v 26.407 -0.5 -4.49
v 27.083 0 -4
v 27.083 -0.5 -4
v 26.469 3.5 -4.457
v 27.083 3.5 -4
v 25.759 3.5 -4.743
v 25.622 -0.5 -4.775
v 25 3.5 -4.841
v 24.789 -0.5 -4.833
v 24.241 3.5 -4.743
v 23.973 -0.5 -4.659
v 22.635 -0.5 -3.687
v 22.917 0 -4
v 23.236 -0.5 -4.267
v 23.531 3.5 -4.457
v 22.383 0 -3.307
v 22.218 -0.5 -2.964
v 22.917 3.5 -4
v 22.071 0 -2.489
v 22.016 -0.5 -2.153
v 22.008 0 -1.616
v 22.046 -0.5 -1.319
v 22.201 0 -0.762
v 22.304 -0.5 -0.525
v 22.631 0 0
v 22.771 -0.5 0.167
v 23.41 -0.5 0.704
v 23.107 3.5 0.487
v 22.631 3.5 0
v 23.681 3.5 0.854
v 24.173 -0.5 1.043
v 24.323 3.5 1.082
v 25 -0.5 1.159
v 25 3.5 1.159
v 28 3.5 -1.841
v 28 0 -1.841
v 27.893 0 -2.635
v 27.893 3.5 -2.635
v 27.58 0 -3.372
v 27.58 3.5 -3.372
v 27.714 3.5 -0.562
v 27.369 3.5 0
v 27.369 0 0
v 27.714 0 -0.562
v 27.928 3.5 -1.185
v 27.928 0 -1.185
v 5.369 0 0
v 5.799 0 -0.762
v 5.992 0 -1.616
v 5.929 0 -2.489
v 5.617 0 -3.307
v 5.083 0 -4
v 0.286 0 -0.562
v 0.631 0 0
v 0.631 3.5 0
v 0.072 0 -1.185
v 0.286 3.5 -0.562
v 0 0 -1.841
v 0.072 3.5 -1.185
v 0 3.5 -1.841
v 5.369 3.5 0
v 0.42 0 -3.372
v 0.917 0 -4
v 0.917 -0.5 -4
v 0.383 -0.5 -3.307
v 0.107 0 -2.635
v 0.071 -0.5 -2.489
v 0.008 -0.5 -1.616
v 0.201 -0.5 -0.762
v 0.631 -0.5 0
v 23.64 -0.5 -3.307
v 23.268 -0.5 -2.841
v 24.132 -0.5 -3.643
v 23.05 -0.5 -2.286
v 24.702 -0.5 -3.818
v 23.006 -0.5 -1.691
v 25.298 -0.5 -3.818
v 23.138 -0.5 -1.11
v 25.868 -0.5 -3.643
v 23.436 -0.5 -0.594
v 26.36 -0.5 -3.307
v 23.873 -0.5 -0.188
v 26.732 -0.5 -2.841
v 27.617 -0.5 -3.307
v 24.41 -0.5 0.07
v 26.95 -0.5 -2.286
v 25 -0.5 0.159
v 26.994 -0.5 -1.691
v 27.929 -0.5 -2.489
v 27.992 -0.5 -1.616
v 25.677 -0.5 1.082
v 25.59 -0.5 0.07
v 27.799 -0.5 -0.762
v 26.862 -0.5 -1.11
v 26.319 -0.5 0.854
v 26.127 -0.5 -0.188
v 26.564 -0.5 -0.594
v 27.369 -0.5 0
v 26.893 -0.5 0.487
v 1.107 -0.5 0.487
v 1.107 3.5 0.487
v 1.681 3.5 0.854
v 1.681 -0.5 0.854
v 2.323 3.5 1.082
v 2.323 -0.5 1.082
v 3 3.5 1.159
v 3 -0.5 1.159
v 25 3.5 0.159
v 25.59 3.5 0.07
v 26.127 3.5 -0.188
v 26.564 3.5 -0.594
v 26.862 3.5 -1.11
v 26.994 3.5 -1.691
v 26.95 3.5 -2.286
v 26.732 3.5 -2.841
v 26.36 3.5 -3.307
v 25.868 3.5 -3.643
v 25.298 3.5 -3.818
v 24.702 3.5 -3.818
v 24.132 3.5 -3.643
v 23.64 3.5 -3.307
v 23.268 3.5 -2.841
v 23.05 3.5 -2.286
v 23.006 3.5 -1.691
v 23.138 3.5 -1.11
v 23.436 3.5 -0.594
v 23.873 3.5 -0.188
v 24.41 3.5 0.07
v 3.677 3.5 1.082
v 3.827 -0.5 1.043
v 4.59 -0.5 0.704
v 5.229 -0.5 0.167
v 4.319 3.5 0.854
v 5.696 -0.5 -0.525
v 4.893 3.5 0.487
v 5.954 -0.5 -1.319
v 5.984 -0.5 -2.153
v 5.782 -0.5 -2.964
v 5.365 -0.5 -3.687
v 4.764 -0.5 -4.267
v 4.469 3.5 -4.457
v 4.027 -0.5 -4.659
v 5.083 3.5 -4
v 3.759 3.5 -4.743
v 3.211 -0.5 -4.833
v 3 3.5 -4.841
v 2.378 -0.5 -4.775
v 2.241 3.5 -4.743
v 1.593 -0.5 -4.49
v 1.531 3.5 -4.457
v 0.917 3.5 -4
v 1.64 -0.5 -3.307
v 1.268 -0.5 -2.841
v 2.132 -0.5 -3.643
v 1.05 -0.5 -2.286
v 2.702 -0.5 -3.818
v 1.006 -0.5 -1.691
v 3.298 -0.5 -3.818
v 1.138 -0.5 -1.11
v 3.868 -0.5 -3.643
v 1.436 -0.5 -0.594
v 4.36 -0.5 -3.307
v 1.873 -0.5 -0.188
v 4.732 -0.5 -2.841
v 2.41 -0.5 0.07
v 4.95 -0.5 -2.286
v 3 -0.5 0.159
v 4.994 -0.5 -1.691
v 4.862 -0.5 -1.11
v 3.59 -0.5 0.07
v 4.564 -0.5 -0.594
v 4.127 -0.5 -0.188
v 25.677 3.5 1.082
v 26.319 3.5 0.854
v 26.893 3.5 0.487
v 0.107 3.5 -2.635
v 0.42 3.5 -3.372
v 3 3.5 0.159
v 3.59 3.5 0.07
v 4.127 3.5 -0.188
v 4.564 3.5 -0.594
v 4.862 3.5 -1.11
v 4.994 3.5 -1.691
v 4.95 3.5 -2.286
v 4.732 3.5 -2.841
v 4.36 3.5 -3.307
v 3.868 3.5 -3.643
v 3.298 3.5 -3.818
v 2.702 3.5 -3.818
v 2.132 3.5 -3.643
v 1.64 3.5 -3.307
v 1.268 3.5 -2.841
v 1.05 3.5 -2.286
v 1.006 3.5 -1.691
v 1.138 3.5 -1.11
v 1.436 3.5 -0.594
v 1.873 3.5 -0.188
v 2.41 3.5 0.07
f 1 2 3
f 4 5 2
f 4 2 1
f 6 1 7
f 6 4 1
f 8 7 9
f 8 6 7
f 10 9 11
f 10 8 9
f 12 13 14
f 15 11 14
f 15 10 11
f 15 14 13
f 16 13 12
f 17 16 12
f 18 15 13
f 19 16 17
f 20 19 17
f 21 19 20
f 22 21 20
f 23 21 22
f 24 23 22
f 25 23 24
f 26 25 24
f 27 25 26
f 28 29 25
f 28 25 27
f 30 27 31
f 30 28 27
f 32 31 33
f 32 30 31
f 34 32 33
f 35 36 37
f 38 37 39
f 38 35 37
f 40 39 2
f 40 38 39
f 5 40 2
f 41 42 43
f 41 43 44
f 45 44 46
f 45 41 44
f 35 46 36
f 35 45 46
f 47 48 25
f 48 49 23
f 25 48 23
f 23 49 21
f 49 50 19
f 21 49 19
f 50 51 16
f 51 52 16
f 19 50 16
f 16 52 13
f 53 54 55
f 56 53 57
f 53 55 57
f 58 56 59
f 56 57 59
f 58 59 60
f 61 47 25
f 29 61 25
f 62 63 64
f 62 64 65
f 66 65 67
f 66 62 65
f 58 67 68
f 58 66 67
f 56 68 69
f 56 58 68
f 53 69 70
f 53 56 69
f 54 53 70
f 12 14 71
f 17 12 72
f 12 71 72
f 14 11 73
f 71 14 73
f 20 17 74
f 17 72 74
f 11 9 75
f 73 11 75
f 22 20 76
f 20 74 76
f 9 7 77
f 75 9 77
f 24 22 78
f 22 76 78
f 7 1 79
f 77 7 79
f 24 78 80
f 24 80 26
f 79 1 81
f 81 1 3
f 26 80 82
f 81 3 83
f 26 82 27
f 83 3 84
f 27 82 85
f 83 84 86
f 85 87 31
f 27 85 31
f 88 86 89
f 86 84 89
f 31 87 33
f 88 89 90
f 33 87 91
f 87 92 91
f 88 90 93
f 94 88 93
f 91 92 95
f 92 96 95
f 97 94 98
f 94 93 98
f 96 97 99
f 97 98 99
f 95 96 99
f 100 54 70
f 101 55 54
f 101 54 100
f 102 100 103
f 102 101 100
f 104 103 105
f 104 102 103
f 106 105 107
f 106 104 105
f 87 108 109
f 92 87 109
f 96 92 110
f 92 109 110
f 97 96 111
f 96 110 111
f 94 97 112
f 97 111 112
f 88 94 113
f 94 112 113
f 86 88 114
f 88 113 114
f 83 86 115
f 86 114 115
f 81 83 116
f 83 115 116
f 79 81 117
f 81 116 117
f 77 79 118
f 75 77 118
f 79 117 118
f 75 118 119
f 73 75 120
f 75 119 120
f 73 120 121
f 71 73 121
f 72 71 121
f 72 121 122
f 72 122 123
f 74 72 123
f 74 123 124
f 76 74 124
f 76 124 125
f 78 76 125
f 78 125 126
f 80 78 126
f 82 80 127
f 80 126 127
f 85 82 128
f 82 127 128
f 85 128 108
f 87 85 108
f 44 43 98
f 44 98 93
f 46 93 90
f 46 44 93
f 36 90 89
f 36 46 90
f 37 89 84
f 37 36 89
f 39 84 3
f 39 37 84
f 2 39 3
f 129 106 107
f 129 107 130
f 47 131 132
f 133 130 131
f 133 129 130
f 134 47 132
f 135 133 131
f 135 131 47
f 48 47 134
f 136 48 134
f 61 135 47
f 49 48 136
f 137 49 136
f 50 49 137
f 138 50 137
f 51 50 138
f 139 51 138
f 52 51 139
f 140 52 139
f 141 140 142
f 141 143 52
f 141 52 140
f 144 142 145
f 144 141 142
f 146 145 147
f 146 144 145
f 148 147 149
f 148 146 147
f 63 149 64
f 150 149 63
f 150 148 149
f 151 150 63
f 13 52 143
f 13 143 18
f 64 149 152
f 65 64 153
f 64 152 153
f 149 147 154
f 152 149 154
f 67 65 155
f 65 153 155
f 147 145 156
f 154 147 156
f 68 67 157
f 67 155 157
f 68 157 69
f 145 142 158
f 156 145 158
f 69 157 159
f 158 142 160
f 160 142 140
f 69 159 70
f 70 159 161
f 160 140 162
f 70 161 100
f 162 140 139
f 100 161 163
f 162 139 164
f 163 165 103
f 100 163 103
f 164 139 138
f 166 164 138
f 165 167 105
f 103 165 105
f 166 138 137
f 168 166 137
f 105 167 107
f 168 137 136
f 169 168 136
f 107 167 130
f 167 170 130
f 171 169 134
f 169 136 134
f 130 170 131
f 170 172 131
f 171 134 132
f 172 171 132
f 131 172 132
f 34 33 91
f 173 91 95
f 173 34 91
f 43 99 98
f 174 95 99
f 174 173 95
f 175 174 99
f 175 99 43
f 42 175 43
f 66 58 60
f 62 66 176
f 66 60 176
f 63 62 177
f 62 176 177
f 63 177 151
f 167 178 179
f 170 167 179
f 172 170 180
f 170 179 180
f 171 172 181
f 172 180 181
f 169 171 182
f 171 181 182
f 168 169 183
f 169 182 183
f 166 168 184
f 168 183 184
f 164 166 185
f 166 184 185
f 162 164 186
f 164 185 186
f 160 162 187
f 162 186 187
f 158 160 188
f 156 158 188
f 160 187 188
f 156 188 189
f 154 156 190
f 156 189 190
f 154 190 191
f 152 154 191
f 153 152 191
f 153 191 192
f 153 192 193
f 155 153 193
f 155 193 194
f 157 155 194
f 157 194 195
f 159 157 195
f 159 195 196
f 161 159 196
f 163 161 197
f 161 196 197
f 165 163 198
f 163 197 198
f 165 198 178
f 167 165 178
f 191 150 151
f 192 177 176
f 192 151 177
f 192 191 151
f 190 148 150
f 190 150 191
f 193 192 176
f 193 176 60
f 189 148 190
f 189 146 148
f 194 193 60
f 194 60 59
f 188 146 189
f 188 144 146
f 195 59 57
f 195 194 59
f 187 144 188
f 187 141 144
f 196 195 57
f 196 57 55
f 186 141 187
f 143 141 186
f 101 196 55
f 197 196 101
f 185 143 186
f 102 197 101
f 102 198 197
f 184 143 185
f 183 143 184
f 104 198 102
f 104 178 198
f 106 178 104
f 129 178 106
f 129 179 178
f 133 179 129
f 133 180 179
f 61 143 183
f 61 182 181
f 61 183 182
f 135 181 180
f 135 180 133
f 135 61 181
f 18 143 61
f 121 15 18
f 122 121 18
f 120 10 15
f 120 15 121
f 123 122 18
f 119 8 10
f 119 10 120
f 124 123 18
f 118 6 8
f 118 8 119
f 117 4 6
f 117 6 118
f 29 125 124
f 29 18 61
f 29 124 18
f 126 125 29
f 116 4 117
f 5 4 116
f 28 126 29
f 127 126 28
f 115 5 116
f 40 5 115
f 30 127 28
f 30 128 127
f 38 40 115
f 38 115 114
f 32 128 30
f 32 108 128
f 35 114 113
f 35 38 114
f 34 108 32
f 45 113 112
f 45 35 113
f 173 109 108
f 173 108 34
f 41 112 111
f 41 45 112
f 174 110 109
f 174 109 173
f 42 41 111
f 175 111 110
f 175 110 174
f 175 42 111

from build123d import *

# Parameters (mm, degrees)
ESQUISSE1_W             = 28
ESQUISSE1_H             = 4
BOSS_EXTRU_1_DEPTH      = 3.5
ESQUISSE2_R             = 3
BOSS_EXTRU_2_DEPTH      = 4
ESQUISSE3_R             = 2
ENL_V_MAT_EXTRU_1_DEPTH = 4
ENL_V_MAT_EXTRU_2_DEPTH = 4
ENL_V_MAT_EXTRU_3_DEPTH = 4


with BuildPart() as part:
    # Esquisse1 → Boss.-Extru.1 (new body)
    with BuildSketch(Plane(origin=(0, 0, 0), x_dir=(1, 0, 0), z_dir=(0, 1, 0))):
        with Locations((14, 2)):
            Rectangle(ESQUISSE1_W, ESQUISSE1_H)
    extrude(amount=BOSS_EXTRU_1_DEPTH)

    # Esquisse2 → Boss.-Extru.2 (add)
    with BuildSketch(Plane(origin=(0, 3.5, 0), x_dir=(1, 0, 0), z_dir=(0, 1, 0))):
        with Locations(Location((3, 1.840675307, 0), (0, 0, 270))):
            Circle(ESQUISSE2_R)
        with Locations(Location((25, 1.840675307, 0), (0, 0, 270))):
            Circle(ESQUISSE2_R)
    extrude(amount=-BOSS_EXTRU_2_DEPTH)

    # Esquisse3 → Enlèv. mat.-Extru.1 (cut)
    with BuildSketch(Plane(origin=(0, 3.5, 0), x_dir=(1, 0, 0), z_dir=(0, 1, 0))):
        with Locations(Location((3, 1.840675307, 0), (0, 0, 270))):
            Circle(ESQUISSE3_R)
        with Locations(Location((25, 1.840675307, 0), (0, 0, 270))):
            Circle(ESQUISSE3_R)
    extrude(amount=-ENL_V_MAT_EXTRU_1_DEPTH, mode=Mode.SUBTRACT)

    # Esquisse4 → Enlèv. mat.-Extru.2 (cut)
    with BuildSketch(Plane(origin=(0, 3.5, 0), x_dir=(1, 0, 0), z_dir=(0, 1, 0))):
        with BuildLine():
            Line((0.917377406, 4), (-0.491965761, 5.461248673))
            Line((-0.491965761, 5.461248673), (-4.245883295, 1.840675307))
            Line((-4.245883295, 1.840675307), (-0.73023333, -1.804454542))
            Line((-0.73023333, -1.804454542), (0.631052045, 0))
            ThreePointArc((0.631052045, 0), (0.007656422, 2.054871271), (0.917377406, 4))
        make_face()
    extrude(amount=-ENL_V_MAT_EXTRU_2_DEPTH, mode=Mode.SUBTRACT)

    # Esquisse5 → Enlèv. mat.-Extru.3 (cut)
    with BuildSketch(Plane(origin=(0, 3.5, 0), x_dir=(1, 0, 0), z_dir=(0, 1, 0))):
        with BuildLine():
            Line((27.082622594, 4), (30.63271591, 7.550093316))
            Line((30.63271591, 7.550093316), (35.597188908, 2.585620319))
            Line((35.597188908, 2.585620319), (29.60753561, -3.40403298))
            Line((29.60753561, -3.40403298), (27.368947955, 0))
            ThreePointArc((27.368947955, 0), (27.992343578, 2.054871271), (27.082622594, 4))
        make_face()
    extrude(amount=-ENL_V_MAT_EXTRU_3_DEPTH, mode=Mode.SUBTRACT)


solid = part.part
